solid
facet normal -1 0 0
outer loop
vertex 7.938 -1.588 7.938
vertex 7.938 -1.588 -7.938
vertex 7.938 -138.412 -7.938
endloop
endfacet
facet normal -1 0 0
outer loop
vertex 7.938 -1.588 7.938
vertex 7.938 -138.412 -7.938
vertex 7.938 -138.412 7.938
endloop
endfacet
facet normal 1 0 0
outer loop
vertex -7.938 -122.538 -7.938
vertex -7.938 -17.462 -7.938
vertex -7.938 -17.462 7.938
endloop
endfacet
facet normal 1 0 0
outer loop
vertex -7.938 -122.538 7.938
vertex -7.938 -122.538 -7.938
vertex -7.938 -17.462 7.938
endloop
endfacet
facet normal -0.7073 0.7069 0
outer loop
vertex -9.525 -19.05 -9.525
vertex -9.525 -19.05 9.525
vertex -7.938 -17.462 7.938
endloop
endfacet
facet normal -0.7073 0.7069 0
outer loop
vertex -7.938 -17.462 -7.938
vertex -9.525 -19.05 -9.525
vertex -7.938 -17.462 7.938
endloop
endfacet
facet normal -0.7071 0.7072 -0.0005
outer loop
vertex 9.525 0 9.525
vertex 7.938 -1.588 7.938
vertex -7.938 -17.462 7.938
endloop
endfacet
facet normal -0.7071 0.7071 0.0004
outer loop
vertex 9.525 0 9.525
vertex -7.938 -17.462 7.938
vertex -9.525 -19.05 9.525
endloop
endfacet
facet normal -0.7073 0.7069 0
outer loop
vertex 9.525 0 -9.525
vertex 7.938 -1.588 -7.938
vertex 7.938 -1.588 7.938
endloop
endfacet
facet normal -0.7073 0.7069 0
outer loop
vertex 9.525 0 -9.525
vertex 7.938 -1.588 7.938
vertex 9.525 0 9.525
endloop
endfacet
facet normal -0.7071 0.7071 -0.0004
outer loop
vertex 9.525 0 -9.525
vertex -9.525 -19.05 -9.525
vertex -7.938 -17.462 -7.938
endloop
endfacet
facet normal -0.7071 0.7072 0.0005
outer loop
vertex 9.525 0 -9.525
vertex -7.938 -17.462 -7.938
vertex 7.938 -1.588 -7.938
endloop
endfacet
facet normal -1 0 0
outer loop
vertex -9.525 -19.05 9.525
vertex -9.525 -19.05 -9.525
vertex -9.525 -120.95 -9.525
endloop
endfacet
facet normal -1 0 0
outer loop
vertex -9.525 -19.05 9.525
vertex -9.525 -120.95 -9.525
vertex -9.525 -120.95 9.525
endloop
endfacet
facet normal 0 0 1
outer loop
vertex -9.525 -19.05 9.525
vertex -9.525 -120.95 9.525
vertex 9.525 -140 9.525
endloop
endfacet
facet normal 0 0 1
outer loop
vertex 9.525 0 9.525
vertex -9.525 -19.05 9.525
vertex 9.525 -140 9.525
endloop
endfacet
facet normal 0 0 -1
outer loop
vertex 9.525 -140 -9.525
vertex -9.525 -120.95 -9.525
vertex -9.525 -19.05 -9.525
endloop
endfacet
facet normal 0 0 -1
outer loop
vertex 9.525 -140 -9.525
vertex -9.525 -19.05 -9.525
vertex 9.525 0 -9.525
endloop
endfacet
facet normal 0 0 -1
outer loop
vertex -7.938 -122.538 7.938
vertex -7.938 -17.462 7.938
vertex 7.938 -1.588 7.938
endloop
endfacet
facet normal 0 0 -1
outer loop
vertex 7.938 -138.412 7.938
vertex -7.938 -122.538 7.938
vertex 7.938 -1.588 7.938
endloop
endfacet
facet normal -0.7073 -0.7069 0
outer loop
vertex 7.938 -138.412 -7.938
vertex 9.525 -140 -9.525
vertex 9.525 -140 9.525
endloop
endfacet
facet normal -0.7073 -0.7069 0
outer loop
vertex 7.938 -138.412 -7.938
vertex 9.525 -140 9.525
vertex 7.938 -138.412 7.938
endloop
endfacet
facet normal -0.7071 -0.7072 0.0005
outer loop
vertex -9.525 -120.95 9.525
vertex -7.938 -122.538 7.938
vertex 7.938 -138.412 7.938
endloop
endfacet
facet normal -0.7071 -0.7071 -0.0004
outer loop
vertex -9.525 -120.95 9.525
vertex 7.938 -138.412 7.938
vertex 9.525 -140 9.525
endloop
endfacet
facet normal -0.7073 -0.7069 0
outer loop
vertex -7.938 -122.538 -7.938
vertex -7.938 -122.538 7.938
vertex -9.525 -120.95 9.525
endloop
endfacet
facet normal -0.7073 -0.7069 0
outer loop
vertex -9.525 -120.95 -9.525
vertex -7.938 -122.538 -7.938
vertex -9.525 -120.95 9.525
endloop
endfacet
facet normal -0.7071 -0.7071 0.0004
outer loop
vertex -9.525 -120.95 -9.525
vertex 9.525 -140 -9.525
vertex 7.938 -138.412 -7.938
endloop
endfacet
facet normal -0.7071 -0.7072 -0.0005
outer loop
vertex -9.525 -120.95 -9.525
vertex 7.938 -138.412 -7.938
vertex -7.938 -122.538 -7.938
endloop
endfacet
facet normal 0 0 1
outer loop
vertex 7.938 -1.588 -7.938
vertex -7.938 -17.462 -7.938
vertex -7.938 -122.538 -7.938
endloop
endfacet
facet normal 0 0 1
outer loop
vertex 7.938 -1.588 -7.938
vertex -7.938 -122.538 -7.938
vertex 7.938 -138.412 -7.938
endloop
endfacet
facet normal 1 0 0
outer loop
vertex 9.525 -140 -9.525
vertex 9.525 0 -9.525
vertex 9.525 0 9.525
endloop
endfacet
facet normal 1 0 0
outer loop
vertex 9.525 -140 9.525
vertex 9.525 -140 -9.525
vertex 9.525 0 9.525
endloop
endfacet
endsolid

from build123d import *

# Parameters (mm, degrees)
F0_W     = 19.05
F0_H     = 19.05
F0_W_2   = 15.875
F0_H_2   = 15.875
F1_DEPTH = 140
F3_DEPTH = 9.526
F4_DEPTH = 9.526


with BuildPart() as f1:
    # F0 (on Front) → F1 (new body)
    with BuildSketch(Plane.XZ):
        Rectangle(F0_W, F0_H)
        Rectangle(F0_W_2, F0_H_2, mode=Mode.SUBTRACT)
    extrude(amount=F1_DEPTH)

    # F2 (on Top) → F3 (cut, through all)
    with BuildSketch(Plane.XY):
        Polygon((9.525, 0), (-9.525, 0), (-9.525, -19.05), align=None)
        Polygon((-9.525, -120.95), (-9.525, -140), (9.525, -140), align=None)
    extrude(amount=-F3_DEPTH, mode=Mode.SUBTRACT)

    # F2 (on Top) → F4 (cut, through all)
    with BuildSketch(Plane.XY):
        Polygon((9.525, 0), (-9.525, 0), (-9.525, -19.05), align=None)
        Polygon((-9.525, -120.95), (-9.525, -140), (9.525, -140), align=None)
    extrude(amount=F4_DEPTH, mode=Mode.SUBTRACT)


solid = f1.part
